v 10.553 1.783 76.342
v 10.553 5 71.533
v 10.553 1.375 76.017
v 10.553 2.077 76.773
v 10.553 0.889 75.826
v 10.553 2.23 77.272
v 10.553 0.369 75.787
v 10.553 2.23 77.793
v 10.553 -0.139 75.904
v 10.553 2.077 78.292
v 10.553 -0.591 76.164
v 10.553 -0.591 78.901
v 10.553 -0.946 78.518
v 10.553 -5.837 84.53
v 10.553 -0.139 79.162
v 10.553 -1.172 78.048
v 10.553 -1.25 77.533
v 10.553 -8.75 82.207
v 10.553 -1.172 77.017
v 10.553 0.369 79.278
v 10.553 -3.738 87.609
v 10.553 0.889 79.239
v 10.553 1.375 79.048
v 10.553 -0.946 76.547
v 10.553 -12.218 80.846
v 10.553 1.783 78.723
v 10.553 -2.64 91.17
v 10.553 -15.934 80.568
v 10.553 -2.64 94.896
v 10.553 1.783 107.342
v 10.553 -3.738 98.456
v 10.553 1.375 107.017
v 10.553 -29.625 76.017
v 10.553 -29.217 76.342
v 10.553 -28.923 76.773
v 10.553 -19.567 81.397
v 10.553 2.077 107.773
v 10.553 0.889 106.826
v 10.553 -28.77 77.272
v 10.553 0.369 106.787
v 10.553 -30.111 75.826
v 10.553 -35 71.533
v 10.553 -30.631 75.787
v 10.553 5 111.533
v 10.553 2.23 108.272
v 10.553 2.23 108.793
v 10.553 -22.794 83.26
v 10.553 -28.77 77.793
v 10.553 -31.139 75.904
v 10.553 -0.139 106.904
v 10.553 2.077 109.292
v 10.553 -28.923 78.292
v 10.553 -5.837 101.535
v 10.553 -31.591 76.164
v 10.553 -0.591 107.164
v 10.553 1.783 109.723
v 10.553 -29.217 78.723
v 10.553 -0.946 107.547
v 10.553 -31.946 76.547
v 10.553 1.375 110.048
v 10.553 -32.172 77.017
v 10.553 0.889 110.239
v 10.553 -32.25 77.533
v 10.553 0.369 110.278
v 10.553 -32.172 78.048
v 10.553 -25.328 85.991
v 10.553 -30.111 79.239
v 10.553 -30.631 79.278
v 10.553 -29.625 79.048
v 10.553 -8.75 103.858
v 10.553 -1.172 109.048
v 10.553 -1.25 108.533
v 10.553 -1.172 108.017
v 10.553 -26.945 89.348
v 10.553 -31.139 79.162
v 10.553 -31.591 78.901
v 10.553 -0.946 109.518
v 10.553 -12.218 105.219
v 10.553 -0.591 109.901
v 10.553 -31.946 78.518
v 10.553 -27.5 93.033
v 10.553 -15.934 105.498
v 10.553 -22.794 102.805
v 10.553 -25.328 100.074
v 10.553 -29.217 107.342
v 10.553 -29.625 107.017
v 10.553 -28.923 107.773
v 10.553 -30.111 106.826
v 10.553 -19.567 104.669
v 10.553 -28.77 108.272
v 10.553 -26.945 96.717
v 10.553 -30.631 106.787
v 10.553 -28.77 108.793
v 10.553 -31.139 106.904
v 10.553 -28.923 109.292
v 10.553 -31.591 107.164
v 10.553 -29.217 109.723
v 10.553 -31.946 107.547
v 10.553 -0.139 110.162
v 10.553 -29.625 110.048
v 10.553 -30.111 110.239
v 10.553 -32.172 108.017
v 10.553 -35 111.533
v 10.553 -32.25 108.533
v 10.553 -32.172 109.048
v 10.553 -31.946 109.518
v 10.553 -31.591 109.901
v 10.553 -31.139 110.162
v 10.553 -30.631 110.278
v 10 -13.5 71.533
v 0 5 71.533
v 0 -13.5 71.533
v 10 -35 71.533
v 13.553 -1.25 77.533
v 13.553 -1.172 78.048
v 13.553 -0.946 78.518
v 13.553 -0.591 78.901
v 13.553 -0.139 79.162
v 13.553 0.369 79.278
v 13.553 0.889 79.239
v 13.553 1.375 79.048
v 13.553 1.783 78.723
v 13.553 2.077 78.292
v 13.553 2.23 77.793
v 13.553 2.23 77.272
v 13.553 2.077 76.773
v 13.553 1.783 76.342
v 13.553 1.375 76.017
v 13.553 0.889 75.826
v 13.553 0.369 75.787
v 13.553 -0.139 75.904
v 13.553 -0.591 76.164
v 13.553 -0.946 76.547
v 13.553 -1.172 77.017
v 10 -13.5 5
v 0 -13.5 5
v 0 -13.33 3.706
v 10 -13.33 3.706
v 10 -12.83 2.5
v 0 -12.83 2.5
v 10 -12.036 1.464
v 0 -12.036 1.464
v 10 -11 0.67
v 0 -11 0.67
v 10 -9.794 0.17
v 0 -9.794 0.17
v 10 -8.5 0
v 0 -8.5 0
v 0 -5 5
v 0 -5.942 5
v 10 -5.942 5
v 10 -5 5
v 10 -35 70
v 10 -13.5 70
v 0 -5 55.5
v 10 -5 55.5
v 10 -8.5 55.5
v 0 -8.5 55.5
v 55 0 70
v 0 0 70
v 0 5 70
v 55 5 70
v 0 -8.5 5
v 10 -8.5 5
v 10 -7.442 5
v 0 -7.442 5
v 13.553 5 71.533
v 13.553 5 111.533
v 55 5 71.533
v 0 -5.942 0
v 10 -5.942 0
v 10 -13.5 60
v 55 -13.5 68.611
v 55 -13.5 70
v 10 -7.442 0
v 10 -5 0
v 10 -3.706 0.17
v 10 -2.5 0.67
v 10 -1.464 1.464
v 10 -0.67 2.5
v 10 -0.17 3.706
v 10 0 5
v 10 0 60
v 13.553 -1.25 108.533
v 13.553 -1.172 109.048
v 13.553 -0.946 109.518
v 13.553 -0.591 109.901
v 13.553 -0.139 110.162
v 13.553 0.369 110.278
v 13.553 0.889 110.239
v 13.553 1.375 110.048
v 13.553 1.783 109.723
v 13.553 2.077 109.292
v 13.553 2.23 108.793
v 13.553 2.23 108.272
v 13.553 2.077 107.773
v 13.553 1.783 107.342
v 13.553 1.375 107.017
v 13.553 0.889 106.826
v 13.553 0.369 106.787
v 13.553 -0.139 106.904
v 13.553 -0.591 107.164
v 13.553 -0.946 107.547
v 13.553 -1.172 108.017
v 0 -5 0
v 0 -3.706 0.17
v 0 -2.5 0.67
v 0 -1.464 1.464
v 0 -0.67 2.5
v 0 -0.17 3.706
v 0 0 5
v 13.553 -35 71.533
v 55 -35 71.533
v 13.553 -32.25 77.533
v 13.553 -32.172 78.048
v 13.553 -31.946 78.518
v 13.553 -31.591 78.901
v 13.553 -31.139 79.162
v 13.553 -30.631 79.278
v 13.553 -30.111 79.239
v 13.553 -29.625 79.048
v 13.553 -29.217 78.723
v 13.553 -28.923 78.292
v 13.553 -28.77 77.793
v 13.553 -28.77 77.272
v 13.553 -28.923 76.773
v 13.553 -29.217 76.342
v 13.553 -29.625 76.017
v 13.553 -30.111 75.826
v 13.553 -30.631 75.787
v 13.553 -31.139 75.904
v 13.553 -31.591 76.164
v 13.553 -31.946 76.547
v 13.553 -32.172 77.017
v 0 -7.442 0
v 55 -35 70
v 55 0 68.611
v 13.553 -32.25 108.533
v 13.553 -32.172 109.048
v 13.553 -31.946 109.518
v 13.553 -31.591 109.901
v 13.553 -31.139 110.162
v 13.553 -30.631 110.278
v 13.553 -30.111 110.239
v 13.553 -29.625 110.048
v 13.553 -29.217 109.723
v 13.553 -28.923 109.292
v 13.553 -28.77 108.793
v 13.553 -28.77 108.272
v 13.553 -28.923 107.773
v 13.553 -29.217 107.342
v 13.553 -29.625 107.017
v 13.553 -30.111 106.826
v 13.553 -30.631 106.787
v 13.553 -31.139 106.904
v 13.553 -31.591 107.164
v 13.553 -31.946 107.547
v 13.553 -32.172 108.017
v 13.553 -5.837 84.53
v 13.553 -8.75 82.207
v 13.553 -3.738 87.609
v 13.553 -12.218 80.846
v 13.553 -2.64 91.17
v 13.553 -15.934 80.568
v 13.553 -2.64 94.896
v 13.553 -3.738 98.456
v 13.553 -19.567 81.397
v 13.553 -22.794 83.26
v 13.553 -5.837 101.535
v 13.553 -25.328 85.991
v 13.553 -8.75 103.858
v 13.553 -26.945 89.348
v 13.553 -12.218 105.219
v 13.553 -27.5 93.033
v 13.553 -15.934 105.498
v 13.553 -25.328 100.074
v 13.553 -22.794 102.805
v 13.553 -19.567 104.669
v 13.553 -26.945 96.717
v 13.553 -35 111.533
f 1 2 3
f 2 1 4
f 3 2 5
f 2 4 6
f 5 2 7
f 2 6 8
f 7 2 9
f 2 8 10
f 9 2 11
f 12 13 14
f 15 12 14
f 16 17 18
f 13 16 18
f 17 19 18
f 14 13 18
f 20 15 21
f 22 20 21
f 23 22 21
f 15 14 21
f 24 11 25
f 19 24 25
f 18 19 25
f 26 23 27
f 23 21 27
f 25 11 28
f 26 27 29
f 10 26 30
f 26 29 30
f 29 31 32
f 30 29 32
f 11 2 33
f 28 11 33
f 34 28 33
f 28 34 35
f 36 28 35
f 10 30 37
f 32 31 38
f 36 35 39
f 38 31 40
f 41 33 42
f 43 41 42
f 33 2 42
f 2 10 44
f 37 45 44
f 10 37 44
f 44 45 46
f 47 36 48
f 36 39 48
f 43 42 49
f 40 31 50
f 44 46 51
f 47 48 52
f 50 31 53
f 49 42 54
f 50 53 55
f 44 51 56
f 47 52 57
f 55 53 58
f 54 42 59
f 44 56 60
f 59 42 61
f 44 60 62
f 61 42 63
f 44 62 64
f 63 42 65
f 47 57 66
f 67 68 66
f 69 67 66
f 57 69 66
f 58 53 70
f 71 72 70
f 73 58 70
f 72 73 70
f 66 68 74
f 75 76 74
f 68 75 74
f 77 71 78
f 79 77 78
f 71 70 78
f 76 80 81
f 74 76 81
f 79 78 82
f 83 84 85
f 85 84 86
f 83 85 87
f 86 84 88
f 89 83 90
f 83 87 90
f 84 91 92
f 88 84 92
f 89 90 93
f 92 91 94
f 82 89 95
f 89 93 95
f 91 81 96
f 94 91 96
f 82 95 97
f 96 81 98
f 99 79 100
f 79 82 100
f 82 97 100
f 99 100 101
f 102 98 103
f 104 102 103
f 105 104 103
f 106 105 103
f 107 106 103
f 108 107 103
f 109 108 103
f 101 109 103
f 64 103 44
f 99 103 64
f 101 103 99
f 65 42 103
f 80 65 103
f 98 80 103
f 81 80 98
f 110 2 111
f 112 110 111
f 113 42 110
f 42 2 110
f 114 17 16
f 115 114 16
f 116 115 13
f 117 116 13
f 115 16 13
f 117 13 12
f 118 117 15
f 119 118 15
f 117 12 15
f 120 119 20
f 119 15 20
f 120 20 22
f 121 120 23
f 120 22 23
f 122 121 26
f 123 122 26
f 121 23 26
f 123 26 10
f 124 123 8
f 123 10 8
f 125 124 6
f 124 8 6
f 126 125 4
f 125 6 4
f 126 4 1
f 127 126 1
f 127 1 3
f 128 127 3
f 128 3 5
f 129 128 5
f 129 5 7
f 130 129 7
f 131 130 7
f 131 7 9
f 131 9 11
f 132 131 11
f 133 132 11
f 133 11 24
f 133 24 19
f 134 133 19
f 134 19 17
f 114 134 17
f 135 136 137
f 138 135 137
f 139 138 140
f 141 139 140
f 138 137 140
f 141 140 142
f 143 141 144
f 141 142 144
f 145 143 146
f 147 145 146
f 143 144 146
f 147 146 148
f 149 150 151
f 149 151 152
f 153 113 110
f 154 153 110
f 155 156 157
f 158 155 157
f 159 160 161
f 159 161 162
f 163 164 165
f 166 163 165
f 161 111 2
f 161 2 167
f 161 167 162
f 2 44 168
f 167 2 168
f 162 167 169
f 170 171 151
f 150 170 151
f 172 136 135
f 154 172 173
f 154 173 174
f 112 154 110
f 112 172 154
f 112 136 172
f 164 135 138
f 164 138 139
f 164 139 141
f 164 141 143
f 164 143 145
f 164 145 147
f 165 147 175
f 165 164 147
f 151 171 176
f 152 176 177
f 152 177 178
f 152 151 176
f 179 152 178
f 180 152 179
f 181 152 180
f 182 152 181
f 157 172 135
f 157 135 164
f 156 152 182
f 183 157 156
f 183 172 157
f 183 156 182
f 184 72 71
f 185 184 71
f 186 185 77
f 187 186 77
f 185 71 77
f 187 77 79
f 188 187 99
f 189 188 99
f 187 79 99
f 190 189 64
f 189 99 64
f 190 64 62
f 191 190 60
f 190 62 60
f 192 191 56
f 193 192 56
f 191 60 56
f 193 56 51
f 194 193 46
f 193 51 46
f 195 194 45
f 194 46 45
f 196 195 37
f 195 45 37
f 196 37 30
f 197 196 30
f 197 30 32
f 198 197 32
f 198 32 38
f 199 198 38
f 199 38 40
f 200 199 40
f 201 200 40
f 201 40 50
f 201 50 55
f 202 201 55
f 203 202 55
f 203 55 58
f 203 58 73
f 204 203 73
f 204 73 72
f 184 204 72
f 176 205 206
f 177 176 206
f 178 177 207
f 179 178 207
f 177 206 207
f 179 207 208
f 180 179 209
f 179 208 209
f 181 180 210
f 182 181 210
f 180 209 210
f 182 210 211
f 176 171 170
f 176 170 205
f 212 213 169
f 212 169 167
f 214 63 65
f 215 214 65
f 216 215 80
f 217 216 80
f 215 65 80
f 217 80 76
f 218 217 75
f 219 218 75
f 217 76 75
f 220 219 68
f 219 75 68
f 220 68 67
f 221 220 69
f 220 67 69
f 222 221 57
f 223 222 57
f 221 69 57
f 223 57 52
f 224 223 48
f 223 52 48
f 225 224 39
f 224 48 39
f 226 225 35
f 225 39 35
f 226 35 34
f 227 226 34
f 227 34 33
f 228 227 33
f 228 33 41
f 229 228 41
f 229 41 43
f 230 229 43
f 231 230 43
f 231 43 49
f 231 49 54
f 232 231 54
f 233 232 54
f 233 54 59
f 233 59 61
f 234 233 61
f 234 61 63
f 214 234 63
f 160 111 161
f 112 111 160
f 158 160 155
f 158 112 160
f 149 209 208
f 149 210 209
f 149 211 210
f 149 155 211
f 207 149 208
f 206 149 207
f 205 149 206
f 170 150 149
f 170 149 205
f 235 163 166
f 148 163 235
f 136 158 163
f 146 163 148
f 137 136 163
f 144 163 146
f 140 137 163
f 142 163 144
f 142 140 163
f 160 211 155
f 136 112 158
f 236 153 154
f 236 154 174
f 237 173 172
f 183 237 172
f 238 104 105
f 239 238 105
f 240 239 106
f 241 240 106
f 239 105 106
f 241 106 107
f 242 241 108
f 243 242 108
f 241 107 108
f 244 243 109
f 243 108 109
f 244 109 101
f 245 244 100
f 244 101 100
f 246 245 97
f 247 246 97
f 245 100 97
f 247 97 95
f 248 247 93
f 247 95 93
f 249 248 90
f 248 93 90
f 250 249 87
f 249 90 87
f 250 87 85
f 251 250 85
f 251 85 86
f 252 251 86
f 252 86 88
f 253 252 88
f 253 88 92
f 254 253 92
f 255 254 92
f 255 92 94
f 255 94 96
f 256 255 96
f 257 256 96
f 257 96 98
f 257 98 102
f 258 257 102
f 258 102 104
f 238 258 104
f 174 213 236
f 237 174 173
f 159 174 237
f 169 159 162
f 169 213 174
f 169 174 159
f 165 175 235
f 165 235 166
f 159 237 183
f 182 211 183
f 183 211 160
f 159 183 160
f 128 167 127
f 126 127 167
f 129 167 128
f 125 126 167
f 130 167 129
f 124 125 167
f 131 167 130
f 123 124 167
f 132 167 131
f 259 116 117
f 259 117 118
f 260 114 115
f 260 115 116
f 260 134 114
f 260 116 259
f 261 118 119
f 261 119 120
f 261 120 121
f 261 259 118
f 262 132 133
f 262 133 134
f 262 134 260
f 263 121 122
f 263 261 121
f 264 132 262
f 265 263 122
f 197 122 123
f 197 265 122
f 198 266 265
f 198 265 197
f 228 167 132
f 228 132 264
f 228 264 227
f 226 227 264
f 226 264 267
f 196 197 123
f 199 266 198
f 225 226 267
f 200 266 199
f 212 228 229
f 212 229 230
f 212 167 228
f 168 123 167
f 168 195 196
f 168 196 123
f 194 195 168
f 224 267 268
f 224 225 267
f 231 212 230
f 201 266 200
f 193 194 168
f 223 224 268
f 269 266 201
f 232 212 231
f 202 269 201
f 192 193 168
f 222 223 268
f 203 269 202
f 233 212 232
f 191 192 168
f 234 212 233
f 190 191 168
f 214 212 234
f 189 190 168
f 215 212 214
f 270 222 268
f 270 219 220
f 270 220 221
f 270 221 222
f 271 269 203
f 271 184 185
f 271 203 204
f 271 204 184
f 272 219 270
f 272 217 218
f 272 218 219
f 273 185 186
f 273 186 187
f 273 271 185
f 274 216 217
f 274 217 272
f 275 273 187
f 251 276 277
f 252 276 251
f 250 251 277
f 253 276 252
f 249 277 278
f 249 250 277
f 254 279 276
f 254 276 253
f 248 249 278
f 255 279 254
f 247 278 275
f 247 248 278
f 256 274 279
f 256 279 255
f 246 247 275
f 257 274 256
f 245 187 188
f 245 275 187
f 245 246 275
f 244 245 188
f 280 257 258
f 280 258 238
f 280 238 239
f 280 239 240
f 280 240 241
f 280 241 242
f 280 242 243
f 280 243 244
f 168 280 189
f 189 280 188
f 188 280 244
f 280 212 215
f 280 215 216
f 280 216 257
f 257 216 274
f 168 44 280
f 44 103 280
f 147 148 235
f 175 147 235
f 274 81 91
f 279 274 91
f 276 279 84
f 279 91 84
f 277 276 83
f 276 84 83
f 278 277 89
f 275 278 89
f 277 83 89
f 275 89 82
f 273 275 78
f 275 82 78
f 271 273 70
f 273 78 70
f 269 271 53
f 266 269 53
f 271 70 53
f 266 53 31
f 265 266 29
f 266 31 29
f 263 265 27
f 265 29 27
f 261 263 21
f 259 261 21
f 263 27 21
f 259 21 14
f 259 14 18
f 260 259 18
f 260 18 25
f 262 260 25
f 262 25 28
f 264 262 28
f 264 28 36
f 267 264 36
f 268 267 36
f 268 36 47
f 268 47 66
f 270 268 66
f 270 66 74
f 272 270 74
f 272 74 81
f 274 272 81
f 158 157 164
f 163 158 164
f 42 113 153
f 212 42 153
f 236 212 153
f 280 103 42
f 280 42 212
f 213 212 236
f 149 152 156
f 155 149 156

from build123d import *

# Parameters (mm, degrees)
F1_DEPTH      = 10
F2_W          = 1.5
F2_H          = 5
F3_DEPTH      = 11
F4_W          = 3
F4_H          = 40
F5_DEPTH      = 35
F5_DEPTH_BACK = 5
F6_W          = 13.5
F6_H          = 10
F7_DEPTH      = 45
F9_DEPTH      = 15
F10_R         = 1.75
F10_R_2       = 12.5
F11_DEPTH     = 25
F12_W         = 10
F12_H         = 21.5
F13_DEPTH     = 25


with BuildPart() as f1:
    # F0 (on Right) → F1 (new body)
    with BuildSketch(Plane.YZ):
        with BuildLine():
            Line((-8.5, 0), (-5, 0))
            ThreePointArc((-5, 0), (-1.464466, 1.464466), (0, 5))
            Line((0, 5), (0, 70))
            Line((0, 70), (-13.5, 70))
            Line((-13.5, 70), (-13.5, 5))
            ThreePointArc((-13.5, 5), (-12.035534, 1.464466), (-8.5, 0))
        make_face()
    extrude(amount=F1_DEPTH)

    # F2 (on face) → F3 (cut)
    with BuildSketch(Plane.YZ.offset(10)):
        Polygon((-5, 55.5), (-8.5, 55.5), (-8.5, 5), (-7.441577, 5), (-5.941577, 5), (-5, 5), align=None)
        with Locations((-6.691577, 2.5)):
            Rectangle(F2_W, F2_H)
    extrude(amount=-F3_DEPTH, mode=Mode.SUBTRACT)

    # F4 (on Front) → F5 (join, two sides)
    with BuildSketch(Plane.XZ) as f5_sk:
        Polygon((10.552509, 71.532604), (0, 71.532604), (0, 70), (55, 70), (55, 71.532604), (13.552509, 71.532604), align=None)
        with Locations((12.052509, 91.532604)):
            Rectangle(F4_W, F4_H)
    extrude(amount=F5_DEPTH)
    extrude(f5_sk.sketch, amount=-F5_DEPTH_BACK)

    # F6 (on face) → F7 (join, through all)
    with BuildSketch(Plane.YZ.offset(10)):
        with Locations((-6.75, 65)):
            Rectangle(F6_W, F6_H)
    extrude(amount=F7_DEPTH)

    # F8 (on face) → F9 (cut)
    with BuildSketch(Plane.XZ.offset(13.5)):
        Polygon((55, 68.611123), (10, 60), (55, 60), align=None)
    extrude(amount=-F9_DEPTH, mode=Mode.SUBTRACT)

    # F10 (on face) → F11 (cut)
    with BuildSketch(Plane(origin=(10.552509, 0, 0), x_dir=(0, -1, 0), z_dir=(-1, 0, 0))):
        with Locations((-0.5, 108.532604)):
            Circle(F10_R)
        with Locations((30.5, 108.532604)):
            Circle(F10_R)
        with Locations((30.5, 77.532604)):
            Circle(F10_R)
        with Locations((-0.5, 77.532604)):
            Circle(F10_R)
        with Locations((15, 93.032604)):
            Circle(F10_R_2)
    extrude(amount=-F11_DEPTH, mode=Mode.SUBTRACT)

    # F12 (on face) → F13 (cut)
    with BuildSketch(Plane.XY.offset(71.532604)):
        with Locations((5, -24.25)):
            Rectangle(F12_W, F12_H)
    extrude(amount=-F13_DEPTH, mode=Mode.SUBTRACT)


solid = f1.part
